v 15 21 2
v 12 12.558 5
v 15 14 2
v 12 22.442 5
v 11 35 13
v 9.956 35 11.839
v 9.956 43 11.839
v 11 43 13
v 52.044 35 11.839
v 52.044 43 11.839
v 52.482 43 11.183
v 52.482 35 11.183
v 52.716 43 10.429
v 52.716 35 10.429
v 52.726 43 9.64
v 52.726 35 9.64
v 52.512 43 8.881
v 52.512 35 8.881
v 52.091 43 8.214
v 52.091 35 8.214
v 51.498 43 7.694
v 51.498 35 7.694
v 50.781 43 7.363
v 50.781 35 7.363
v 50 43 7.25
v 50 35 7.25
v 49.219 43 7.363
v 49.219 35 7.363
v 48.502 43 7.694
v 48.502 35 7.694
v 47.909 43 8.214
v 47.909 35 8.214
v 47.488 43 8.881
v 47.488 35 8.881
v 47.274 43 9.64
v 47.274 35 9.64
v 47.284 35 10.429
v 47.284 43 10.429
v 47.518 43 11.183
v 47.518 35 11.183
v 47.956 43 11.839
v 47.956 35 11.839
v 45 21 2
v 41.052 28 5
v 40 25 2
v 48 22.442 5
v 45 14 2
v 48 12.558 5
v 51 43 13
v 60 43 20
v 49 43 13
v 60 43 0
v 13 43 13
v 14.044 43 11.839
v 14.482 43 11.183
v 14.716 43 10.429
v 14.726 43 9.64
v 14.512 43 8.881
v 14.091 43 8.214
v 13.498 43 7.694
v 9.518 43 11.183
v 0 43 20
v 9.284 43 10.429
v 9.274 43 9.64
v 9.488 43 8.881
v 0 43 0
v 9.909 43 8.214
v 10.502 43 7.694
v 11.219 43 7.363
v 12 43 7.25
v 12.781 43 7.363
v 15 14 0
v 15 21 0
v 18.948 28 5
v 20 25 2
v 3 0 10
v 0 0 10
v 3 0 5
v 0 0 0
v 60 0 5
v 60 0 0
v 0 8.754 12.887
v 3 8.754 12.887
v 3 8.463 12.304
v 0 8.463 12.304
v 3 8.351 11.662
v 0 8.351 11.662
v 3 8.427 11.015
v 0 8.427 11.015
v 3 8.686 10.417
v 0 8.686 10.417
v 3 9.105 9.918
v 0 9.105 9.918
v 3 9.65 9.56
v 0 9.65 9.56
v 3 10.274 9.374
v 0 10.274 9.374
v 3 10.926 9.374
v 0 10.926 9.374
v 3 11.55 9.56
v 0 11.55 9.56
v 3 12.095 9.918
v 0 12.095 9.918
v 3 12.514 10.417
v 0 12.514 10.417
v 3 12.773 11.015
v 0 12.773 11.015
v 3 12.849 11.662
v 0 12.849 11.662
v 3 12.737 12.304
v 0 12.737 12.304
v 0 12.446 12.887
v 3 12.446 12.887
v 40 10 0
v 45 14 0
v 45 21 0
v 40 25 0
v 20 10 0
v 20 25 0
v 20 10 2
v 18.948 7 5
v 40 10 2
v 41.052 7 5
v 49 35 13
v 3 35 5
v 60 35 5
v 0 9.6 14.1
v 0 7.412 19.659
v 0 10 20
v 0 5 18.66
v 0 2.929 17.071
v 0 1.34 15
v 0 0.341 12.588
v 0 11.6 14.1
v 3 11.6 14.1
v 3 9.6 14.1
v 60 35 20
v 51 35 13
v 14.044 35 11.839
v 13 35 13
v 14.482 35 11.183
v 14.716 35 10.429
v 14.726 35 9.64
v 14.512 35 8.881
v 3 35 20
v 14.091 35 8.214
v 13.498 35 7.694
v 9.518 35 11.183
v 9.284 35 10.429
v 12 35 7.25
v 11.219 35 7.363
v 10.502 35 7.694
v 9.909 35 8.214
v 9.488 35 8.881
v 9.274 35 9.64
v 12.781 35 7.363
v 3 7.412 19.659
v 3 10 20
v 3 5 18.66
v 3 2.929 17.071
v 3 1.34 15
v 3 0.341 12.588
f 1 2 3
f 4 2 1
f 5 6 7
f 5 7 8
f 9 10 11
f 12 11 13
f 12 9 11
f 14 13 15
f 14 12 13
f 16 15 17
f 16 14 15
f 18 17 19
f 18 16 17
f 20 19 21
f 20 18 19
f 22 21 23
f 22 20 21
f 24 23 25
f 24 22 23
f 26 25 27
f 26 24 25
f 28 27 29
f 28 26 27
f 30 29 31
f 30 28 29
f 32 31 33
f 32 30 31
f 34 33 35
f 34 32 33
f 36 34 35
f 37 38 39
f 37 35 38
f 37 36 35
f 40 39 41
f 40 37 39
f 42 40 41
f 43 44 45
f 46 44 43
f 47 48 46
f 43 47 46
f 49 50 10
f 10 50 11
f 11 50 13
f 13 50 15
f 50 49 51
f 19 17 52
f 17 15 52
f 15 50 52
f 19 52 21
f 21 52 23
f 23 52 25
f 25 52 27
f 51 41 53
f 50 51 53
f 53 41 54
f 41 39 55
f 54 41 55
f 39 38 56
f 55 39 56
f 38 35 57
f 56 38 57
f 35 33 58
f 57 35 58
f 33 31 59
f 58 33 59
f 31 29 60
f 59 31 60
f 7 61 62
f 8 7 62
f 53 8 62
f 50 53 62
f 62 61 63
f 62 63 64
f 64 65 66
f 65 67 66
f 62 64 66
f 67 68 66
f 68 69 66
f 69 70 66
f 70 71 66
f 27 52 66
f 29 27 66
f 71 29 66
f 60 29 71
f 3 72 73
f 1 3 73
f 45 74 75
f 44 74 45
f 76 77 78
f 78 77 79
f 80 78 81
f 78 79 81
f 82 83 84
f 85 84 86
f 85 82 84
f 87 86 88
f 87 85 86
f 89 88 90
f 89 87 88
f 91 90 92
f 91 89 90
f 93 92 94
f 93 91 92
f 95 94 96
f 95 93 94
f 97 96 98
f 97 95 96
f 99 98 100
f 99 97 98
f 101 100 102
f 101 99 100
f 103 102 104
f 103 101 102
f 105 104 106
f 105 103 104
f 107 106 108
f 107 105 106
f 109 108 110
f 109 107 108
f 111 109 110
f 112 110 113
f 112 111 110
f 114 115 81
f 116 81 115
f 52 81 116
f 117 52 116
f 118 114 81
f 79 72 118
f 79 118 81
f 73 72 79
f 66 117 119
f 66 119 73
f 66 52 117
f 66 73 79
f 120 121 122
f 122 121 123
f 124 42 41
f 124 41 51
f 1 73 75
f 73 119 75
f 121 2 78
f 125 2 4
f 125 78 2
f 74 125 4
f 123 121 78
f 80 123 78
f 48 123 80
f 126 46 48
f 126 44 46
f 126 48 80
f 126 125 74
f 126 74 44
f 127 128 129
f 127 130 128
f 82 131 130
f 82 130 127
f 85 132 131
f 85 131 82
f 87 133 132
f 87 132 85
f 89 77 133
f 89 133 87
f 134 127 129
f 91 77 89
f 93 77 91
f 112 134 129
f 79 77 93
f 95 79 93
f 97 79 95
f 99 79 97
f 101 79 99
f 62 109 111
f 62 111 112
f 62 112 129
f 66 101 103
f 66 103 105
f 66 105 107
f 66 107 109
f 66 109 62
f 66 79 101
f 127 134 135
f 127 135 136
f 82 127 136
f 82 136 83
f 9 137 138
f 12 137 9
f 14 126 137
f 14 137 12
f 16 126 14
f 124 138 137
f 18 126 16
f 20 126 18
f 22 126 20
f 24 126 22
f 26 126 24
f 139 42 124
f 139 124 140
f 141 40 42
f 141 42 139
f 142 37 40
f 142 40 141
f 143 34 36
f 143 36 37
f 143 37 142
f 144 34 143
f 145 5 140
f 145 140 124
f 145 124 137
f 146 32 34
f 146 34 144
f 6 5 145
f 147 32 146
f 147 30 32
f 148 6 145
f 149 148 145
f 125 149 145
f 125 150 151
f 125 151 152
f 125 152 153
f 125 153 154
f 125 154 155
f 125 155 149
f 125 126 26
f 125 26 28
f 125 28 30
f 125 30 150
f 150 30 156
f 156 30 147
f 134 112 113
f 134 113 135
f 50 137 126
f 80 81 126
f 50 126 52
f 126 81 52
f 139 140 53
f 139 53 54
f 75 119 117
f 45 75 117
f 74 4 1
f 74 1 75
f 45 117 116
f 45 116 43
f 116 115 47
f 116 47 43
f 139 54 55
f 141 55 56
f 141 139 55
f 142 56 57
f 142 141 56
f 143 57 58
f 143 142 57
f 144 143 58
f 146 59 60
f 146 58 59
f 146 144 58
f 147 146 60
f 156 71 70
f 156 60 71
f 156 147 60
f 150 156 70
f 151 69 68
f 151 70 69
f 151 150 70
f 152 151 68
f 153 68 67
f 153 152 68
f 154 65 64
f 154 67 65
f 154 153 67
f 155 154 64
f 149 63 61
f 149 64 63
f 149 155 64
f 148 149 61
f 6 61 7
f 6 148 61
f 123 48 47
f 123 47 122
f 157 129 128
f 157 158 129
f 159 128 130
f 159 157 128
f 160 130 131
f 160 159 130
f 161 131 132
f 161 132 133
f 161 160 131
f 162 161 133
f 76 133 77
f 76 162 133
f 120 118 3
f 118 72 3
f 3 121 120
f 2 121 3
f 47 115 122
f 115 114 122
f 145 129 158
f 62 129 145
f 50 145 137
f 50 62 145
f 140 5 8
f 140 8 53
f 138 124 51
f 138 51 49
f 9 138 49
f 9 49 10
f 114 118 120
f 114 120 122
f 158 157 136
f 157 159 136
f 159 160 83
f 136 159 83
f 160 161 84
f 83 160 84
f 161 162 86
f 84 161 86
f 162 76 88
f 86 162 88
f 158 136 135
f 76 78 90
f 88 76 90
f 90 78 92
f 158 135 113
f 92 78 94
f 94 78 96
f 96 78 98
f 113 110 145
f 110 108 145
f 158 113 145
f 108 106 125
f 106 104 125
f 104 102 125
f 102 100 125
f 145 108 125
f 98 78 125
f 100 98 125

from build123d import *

# Parameters (mm, degrees)
CROQUIS1_W              = 60
CROQUIS1_H              = 35
CROQUIS1_W_2            = 30
CROQUIS1_H_2            = 15
SALIENTE_EXTRUIR1_DEPTH = 5
CHAFL_N2_SIZE           = 4
CHAFL_N2_SIZE2          = 5
CHAFL_N2_PART_2_SIZE    = 4
CHAFL_N2_PART_2_SIZE2   = 5
CHAFL_N3_SIZE           = 5
CHAFL_N3_SIZE2          = 4
CHAFL_N3_PART_2_SIZE    = 5
CHAFL_N3_PART_2_SIZE2   = 4
CHAFL_N1_SIZE           = 3
CROQUIS2_W              = 60
CROQUIS2_H              = 8
SALIENTE_EXTRUIR2_DEPTH = 20
CORTAR_EXTRUIR1_DEPTH   = 9
CROQUIS4_W              = 3
CROQUIS4_H              = 35
SALIENTE_EXTRUIR3_DEPTH = 15
CORTAR_EXTRUIR2_DEPTH   = 10
REDONDEO1_R             = 10


with BuildPart() as part:
    # Croquis1 → Saliente-Extruir1 (new body)
    with BuildSketch(Plane.XY):
        with Locations((30, 17.5)):
            Rectangle(CROQUIS1_W, CROQUIS1_H)
        with Locations((30, 17.5)):
            Rectangle(CROQUIS1_W_2, CROQUIS1_H_2, mode=Mode.SUBTRACT)
    extrude(amount=SALIENTE_EXTRUIR1_DEPTH)

    # Chaflán2
    chafl_n2_edges = [part.edges().sort_by_distance(p)[0] for p in [
        (15, 25, 2.5),
    ]]
    chafl_n2_side = [part.faces().sort_by_distance(p)[0] for p in [
        (15, 17.5, 2.5),
    ]]
    chamfer(chafl_n2_edges, length=CHAFL_N2_SIZE, length2=CHAFL_N2_SIZE2, reference=chafl_n2_side[0])

    # Chaflán2 part 2
    chafl_n2_part_2_edges = [part.edges().sort_by_distance(p)[0] for p in [
        (45, 10, 2.5),
    ]]
    chafl_n2_part_2_side = [part.faces().sort_by_distance(p)[0] for p in [
        (45, 17.5, 2.5),
    ]]
    chamfer(chafl_n2_part_2_edges, length=CHAFL_N2_PART_2_SIZE, length2=CHAFL_N2_PART_2_SIZE2, reference=chafl_n2_part_2_side[0])

    # Chaflán3
    chafl_n3_edges = [part.edges().sort_by_distance(p)[0] for p in [
        (15, 10, 2.5),
    ]]
    chafl_n3_side = [part.faces().sort_by_distance(p)[0] for p in [
        (27.5, 10, 2.5),
    ]]
    chamfer(chafl_n3_edges, length=CHAFL_N3_SIZE, length2=CHAFL_N3_SIZE2, reference=chafl_n3_side[0])

    # Chaflán3 part 2
    chafl_n3_part_2_edges = [part.edges().sort_by_distance(p)[0] for p in [
        (45, 25, 2.5),
    ]]
    chafl_n3_part_2_side = [part.faces().sort_by_distance(p)[0] for p in [
        (32.5, 25, 2.5),
    ]]
    chamfer(chafl_n3_part_2_edges, length=CHAFL_N3_PART_2_SIZE, length2=CHAFL_N3_PART_2_SIZE2, reference=chafl_n3_part_2_side[0])

    # Chaflán1
    chafl_n1_edges = [part.edges().sort_by_distance(p)[0] for p in [
        (45, 17.5, 5),
        (15, 17.5, 5),
        (42.5, 12, 5),
        (17.5, 23, 5),
        (30, 25, 5),
        (30, 10, 5),
        (42.5, 23, 5),
        (17.5, 12, 5),
    ]]
    chamfer(chafl_n1_edges, length=CHAFL_N1_SIZE)

    # Croquis2 → Saliente-Extruir2 (add)
    with BuildSketch(Plane(origin=(0, 0, 0), x_dir=(-1, 0, 0), z_dir=(0, 0, -1))):
        with Locations((-30, 39)):
            Rectangle(CROQUIS2_W, CROQUIS2_H)
    extrude(amount=-SALIENTE_EXTRUIR2_DEPTH)

    # Croquis3 → Cortar-Extruir1 (cut, through all)
    with BuildSketch(Plane.XZ.offset(-35)):
        with BuildLine():
            Line((9.955719163, 11.839406388), (11, 13))
            Line((11, 13), (13, 13))
            Line((13, 13), (14.044280837, 11.839406388))
            ThreePointArc((14.044280837, 11.839406388), (12, 7.25), (9.955719163, 11.839406388))
        make_face()
        with BuildLine():
            Line((47.955719163, 11.839406388), (49, 13))
            Line((49, 13), (51, 13))
            Line((51, 13), (52.044280837, 11.839406388))
            ThreePointArc((52.044280837, 11.839406388), (50, 7.25), (47.955719163, 11.839406388))
        make_face()
    extrude(amount=-CORTAR_EXTRUIR1_DEPTH, mode=Mode.SUBTRACT)

    # Croquis4 → Saliente-Extruir3 (add)
    with BuildSketch(Plane.XY.offset(5)):
        with Locations((1.5, 17.5)):
            Rectangle(CROQUIS4_W, CROQUIS4_H)
    extrude(amount=SALIENTE_EXTRUIR3_DEPTH)

    # Croquis5 → Cortar-Extruir2 (cut)
    with BuildSketch(Plane.ZY):
        with BuildLine():
            Line((12.886683465, 12.445791337), (14.1, 11.6))
            Line((14.1, 11.6), (14.1, 9.6))
            Line((14.1, 9.6), (12.886683465, 8.754208663))
            ThreePointArc((12.886683465, 8.754208663), (9.35, 10.6), (12.886683465, 12.445791337))
        make_face()
    extrude(amount=-CORTAR_EXTRUIR2_DEPTH, mode=Mode.SUBTRACT)

    # Redondeo1
    redondeo1_edges = [part.edges().sort_by_distance(p)[0] for p in [
        (1.5, 0, 20),
    ]]
    fillet(redondeo1_edges, radius=REDONDEO1_R)


solid = part.part
